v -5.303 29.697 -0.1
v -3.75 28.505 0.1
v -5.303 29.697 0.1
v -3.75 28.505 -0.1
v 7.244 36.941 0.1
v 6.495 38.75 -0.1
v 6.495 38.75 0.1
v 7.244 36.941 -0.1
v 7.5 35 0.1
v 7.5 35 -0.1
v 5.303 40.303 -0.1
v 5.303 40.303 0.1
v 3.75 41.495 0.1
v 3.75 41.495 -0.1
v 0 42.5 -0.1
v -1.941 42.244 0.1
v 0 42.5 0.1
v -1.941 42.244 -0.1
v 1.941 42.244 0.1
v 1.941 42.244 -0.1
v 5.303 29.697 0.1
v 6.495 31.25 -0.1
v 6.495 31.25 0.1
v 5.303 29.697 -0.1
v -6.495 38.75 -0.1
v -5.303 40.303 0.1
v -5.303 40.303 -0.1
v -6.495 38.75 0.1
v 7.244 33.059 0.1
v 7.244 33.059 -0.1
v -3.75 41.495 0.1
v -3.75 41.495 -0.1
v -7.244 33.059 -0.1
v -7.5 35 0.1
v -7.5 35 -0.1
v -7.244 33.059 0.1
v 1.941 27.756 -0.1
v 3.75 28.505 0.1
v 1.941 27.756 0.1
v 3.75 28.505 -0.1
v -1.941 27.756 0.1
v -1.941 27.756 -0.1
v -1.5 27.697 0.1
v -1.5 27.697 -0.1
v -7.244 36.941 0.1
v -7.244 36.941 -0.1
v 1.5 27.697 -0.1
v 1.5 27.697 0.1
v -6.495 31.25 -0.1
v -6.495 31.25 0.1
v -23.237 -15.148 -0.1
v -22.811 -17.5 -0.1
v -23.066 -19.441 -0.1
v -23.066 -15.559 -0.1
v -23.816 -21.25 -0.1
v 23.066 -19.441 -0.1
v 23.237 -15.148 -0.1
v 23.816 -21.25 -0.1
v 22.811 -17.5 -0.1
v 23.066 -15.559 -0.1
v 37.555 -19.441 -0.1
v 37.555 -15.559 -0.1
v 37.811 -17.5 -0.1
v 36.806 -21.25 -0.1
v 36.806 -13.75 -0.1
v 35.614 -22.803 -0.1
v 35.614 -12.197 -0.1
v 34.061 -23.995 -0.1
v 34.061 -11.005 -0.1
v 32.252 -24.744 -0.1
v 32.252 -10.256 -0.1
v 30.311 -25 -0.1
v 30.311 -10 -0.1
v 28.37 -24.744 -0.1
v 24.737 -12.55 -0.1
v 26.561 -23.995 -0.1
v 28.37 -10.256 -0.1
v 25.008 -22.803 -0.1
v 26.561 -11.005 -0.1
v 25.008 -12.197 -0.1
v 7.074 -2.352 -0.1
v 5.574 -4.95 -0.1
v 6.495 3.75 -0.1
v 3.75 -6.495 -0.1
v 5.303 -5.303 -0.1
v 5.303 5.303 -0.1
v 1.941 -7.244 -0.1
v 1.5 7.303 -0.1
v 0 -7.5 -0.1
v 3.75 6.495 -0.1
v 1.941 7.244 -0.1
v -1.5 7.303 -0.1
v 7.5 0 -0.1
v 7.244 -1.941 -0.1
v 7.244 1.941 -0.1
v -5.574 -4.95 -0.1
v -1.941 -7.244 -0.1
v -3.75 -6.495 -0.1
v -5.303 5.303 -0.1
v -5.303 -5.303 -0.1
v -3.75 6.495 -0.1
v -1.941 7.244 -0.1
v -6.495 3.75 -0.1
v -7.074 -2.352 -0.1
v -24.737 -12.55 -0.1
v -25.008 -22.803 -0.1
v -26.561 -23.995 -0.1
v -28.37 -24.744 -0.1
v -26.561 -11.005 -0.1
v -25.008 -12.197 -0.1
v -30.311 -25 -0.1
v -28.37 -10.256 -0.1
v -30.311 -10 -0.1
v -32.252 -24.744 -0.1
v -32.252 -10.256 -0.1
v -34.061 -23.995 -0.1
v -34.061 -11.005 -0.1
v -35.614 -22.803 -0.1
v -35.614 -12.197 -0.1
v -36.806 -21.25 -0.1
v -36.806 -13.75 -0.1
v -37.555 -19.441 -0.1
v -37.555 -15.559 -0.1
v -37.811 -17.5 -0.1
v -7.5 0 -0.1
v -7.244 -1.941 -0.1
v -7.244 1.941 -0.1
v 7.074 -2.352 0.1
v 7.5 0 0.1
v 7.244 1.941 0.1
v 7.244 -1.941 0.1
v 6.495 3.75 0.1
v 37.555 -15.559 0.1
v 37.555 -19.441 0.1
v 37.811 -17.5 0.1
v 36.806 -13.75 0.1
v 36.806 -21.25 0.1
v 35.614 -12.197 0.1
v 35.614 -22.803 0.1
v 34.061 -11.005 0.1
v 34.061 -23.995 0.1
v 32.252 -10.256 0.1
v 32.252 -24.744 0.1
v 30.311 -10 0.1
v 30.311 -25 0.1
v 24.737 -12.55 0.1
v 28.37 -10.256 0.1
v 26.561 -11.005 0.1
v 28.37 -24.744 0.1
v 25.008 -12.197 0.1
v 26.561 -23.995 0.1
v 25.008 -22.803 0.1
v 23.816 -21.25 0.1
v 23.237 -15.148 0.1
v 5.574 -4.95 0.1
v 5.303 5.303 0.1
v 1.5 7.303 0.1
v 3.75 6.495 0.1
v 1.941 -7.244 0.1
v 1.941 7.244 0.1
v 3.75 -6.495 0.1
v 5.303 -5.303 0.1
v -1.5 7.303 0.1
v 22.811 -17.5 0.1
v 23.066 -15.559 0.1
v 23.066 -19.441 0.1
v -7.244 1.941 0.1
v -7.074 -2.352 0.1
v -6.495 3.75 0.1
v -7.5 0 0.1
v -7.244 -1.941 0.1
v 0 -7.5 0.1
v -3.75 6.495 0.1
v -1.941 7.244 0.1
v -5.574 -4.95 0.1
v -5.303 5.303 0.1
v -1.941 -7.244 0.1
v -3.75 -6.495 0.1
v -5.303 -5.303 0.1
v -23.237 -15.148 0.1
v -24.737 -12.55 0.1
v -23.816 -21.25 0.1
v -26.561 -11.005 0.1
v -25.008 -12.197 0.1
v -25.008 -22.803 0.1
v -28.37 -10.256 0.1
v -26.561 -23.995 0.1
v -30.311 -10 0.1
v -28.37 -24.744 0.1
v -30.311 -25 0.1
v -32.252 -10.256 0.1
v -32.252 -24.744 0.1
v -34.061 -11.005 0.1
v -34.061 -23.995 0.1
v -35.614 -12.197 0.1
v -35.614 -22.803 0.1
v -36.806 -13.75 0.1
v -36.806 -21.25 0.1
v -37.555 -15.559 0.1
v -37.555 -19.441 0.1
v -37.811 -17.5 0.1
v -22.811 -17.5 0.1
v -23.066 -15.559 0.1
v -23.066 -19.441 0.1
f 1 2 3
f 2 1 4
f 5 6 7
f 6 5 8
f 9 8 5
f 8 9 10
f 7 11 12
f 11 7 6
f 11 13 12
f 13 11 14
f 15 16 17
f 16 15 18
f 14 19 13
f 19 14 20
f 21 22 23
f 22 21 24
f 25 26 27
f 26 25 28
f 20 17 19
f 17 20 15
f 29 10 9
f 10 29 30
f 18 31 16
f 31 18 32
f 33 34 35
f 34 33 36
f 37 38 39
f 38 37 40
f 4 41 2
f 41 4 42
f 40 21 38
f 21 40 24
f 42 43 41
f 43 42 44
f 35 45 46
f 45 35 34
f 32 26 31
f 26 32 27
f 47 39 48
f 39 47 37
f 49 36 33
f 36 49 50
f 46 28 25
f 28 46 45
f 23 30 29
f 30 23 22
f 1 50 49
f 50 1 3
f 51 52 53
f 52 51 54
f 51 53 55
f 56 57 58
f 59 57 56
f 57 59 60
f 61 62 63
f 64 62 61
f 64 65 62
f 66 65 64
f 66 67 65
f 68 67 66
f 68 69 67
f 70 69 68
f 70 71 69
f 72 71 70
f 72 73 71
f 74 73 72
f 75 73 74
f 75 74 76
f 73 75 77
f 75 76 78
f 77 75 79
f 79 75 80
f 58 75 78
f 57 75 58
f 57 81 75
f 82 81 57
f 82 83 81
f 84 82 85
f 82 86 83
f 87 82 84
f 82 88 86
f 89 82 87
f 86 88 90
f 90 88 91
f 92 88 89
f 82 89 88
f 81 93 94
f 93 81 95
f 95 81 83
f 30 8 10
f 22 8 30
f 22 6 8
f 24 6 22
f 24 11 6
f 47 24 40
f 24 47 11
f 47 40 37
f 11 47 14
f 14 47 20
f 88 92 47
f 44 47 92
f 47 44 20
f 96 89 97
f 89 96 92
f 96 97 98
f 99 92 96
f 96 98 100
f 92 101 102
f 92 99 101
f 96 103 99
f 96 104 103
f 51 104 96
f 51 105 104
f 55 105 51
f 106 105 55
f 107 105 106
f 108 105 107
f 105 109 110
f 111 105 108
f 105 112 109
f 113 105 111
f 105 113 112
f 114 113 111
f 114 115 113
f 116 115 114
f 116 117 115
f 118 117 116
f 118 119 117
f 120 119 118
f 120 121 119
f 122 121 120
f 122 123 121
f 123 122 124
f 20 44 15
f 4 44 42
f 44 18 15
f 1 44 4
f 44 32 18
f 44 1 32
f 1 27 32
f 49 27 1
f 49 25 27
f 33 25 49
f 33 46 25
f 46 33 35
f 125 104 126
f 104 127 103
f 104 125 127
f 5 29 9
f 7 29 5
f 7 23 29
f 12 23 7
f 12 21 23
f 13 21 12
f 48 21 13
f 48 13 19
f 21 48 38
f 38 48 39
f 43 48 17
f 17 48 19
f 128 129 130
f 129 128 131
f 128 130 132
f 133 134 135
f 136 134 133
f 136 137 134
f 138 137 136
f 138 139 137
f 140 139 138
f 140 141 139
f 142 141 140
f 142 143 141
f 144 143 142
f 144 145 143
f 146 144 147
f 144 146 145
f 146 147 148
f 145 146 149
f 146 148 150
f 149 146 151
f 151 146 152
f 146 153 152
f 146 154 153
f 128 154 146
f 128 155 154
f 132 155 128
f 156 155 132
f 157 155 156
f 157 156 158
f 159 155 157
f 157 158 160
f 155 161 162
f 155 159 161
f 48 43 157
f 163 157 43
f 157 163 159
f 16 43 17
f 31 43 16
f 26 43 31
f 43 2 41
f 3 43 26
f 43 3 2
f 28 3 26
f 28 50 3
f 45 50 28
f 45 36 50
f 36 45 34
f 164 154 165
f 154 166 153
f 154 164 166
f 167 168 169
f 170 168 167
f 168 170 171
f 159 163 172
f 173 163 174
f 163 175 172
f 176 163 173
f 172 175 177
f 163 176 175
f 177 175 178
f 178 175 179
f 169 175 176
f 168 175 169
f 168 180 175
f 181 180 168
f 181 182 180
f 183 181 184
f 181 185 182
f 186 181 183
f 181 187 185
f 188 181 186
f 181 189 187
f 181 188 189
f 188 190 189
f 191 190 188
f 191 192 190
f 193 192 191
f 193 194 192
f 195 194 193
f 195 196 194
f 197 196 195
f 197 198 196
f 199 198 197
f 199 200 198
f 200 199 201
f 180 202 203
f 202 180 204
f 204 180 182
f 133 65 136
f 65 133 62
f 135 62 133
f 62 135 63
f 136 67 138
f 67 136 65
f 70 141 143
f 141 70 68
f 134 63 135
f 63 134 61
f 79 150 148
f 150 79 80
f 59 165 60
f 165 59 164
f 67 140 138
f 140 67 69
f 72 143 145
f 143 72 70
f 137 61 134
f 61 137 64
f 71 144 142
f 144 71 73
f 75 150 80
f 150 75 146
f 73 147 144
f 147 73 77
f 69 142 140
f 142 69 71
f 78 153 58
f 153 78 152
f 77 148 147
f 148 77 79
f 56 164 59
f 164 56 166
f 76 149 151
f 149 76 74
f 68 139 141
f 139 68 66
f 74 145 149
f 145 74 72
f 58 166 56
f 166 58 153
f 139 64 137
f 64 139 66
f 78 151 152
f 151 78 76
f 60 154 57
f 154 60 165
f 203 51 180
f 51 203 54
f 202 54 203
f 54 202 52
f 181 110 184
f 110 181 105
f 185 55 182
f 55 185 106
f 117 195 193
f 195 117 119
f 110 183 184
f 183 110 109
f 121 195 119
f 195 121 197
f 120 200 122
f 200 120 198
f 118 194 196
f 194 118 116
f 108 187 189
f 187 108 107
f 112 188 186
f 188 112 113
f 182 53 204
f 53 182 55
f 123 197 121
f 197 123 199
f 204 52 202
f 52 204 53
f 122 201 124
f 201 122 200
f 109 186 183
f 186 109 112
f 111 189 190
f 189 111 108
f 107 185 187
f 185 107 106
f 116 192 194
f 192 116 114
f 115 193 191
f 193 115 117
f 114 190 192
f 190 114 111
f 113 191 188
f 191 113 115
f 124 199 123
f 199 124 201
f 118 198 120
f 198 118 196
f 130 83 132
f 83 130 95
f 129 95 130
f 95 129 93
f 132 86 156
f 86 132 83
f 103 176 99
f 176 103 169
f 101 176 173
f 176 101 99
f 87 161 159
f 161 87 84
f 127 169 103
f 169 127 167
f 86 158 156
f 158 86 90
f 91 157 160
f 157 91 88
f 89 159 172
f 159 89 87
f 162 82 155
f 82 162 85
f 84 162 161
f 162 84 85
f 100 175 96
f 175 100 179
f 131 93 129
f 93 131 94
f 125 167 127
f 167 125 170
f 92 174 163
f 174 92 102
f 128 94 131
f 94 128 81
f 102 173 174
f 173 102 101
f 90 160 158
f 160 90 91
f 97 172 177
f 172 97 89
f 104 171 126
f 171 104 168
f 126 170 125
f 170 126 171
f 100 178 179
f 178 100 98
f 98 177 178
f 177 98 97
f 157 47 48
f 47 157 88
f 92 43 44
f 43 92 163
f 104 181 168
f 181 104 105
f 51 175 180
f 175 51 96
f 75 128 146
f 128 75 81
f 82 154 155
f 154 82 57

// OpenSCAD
/* [Size] */
size = 85; //[1:500]

circle_diameter = 15; //[1:50]

thickness = 0.2;

module fourPoint1stLayerPrintTest()
{
    rsize = circle_diameter/2;
    xpos= size/2 - rsize;
    ypos = size/2 - rsize;
    
    union() {
        translate([0,ypos,0]){
              cylinder(r=rsize, h=thickness, center = true);
        }
        translate([cos(30)*xpos,-sin(30)*ypos,0]){
              cylinder(r=rsize, h=thickness, center = true);
        }
        translate([-cos(30)*xpos,-sin(30)*ypos,0]){
              cylinder(r=rsize, h=thickness, center = true);
        }
        cylinder(r=rsize, h=thickness, center = true);
        
        translate([0,ypos/2,0]){
              cube([3, size/2, thickness], center = true);
        }
        translate([-cos(30)*xpos/2,-sin(30)*ypos/2,0]){
            rotate([0,0,30])
                cube([size/2, 3, thickness], center = true);
        }
        translate([cos(30)*xpos/2, -sin(30)*ypos/2, 0]){
            rotate([0,0,-30])
                cube([size/2, 3, thickness], center = true);
        }

    }
    
}

fourPoint1stLayerPrintTest();
